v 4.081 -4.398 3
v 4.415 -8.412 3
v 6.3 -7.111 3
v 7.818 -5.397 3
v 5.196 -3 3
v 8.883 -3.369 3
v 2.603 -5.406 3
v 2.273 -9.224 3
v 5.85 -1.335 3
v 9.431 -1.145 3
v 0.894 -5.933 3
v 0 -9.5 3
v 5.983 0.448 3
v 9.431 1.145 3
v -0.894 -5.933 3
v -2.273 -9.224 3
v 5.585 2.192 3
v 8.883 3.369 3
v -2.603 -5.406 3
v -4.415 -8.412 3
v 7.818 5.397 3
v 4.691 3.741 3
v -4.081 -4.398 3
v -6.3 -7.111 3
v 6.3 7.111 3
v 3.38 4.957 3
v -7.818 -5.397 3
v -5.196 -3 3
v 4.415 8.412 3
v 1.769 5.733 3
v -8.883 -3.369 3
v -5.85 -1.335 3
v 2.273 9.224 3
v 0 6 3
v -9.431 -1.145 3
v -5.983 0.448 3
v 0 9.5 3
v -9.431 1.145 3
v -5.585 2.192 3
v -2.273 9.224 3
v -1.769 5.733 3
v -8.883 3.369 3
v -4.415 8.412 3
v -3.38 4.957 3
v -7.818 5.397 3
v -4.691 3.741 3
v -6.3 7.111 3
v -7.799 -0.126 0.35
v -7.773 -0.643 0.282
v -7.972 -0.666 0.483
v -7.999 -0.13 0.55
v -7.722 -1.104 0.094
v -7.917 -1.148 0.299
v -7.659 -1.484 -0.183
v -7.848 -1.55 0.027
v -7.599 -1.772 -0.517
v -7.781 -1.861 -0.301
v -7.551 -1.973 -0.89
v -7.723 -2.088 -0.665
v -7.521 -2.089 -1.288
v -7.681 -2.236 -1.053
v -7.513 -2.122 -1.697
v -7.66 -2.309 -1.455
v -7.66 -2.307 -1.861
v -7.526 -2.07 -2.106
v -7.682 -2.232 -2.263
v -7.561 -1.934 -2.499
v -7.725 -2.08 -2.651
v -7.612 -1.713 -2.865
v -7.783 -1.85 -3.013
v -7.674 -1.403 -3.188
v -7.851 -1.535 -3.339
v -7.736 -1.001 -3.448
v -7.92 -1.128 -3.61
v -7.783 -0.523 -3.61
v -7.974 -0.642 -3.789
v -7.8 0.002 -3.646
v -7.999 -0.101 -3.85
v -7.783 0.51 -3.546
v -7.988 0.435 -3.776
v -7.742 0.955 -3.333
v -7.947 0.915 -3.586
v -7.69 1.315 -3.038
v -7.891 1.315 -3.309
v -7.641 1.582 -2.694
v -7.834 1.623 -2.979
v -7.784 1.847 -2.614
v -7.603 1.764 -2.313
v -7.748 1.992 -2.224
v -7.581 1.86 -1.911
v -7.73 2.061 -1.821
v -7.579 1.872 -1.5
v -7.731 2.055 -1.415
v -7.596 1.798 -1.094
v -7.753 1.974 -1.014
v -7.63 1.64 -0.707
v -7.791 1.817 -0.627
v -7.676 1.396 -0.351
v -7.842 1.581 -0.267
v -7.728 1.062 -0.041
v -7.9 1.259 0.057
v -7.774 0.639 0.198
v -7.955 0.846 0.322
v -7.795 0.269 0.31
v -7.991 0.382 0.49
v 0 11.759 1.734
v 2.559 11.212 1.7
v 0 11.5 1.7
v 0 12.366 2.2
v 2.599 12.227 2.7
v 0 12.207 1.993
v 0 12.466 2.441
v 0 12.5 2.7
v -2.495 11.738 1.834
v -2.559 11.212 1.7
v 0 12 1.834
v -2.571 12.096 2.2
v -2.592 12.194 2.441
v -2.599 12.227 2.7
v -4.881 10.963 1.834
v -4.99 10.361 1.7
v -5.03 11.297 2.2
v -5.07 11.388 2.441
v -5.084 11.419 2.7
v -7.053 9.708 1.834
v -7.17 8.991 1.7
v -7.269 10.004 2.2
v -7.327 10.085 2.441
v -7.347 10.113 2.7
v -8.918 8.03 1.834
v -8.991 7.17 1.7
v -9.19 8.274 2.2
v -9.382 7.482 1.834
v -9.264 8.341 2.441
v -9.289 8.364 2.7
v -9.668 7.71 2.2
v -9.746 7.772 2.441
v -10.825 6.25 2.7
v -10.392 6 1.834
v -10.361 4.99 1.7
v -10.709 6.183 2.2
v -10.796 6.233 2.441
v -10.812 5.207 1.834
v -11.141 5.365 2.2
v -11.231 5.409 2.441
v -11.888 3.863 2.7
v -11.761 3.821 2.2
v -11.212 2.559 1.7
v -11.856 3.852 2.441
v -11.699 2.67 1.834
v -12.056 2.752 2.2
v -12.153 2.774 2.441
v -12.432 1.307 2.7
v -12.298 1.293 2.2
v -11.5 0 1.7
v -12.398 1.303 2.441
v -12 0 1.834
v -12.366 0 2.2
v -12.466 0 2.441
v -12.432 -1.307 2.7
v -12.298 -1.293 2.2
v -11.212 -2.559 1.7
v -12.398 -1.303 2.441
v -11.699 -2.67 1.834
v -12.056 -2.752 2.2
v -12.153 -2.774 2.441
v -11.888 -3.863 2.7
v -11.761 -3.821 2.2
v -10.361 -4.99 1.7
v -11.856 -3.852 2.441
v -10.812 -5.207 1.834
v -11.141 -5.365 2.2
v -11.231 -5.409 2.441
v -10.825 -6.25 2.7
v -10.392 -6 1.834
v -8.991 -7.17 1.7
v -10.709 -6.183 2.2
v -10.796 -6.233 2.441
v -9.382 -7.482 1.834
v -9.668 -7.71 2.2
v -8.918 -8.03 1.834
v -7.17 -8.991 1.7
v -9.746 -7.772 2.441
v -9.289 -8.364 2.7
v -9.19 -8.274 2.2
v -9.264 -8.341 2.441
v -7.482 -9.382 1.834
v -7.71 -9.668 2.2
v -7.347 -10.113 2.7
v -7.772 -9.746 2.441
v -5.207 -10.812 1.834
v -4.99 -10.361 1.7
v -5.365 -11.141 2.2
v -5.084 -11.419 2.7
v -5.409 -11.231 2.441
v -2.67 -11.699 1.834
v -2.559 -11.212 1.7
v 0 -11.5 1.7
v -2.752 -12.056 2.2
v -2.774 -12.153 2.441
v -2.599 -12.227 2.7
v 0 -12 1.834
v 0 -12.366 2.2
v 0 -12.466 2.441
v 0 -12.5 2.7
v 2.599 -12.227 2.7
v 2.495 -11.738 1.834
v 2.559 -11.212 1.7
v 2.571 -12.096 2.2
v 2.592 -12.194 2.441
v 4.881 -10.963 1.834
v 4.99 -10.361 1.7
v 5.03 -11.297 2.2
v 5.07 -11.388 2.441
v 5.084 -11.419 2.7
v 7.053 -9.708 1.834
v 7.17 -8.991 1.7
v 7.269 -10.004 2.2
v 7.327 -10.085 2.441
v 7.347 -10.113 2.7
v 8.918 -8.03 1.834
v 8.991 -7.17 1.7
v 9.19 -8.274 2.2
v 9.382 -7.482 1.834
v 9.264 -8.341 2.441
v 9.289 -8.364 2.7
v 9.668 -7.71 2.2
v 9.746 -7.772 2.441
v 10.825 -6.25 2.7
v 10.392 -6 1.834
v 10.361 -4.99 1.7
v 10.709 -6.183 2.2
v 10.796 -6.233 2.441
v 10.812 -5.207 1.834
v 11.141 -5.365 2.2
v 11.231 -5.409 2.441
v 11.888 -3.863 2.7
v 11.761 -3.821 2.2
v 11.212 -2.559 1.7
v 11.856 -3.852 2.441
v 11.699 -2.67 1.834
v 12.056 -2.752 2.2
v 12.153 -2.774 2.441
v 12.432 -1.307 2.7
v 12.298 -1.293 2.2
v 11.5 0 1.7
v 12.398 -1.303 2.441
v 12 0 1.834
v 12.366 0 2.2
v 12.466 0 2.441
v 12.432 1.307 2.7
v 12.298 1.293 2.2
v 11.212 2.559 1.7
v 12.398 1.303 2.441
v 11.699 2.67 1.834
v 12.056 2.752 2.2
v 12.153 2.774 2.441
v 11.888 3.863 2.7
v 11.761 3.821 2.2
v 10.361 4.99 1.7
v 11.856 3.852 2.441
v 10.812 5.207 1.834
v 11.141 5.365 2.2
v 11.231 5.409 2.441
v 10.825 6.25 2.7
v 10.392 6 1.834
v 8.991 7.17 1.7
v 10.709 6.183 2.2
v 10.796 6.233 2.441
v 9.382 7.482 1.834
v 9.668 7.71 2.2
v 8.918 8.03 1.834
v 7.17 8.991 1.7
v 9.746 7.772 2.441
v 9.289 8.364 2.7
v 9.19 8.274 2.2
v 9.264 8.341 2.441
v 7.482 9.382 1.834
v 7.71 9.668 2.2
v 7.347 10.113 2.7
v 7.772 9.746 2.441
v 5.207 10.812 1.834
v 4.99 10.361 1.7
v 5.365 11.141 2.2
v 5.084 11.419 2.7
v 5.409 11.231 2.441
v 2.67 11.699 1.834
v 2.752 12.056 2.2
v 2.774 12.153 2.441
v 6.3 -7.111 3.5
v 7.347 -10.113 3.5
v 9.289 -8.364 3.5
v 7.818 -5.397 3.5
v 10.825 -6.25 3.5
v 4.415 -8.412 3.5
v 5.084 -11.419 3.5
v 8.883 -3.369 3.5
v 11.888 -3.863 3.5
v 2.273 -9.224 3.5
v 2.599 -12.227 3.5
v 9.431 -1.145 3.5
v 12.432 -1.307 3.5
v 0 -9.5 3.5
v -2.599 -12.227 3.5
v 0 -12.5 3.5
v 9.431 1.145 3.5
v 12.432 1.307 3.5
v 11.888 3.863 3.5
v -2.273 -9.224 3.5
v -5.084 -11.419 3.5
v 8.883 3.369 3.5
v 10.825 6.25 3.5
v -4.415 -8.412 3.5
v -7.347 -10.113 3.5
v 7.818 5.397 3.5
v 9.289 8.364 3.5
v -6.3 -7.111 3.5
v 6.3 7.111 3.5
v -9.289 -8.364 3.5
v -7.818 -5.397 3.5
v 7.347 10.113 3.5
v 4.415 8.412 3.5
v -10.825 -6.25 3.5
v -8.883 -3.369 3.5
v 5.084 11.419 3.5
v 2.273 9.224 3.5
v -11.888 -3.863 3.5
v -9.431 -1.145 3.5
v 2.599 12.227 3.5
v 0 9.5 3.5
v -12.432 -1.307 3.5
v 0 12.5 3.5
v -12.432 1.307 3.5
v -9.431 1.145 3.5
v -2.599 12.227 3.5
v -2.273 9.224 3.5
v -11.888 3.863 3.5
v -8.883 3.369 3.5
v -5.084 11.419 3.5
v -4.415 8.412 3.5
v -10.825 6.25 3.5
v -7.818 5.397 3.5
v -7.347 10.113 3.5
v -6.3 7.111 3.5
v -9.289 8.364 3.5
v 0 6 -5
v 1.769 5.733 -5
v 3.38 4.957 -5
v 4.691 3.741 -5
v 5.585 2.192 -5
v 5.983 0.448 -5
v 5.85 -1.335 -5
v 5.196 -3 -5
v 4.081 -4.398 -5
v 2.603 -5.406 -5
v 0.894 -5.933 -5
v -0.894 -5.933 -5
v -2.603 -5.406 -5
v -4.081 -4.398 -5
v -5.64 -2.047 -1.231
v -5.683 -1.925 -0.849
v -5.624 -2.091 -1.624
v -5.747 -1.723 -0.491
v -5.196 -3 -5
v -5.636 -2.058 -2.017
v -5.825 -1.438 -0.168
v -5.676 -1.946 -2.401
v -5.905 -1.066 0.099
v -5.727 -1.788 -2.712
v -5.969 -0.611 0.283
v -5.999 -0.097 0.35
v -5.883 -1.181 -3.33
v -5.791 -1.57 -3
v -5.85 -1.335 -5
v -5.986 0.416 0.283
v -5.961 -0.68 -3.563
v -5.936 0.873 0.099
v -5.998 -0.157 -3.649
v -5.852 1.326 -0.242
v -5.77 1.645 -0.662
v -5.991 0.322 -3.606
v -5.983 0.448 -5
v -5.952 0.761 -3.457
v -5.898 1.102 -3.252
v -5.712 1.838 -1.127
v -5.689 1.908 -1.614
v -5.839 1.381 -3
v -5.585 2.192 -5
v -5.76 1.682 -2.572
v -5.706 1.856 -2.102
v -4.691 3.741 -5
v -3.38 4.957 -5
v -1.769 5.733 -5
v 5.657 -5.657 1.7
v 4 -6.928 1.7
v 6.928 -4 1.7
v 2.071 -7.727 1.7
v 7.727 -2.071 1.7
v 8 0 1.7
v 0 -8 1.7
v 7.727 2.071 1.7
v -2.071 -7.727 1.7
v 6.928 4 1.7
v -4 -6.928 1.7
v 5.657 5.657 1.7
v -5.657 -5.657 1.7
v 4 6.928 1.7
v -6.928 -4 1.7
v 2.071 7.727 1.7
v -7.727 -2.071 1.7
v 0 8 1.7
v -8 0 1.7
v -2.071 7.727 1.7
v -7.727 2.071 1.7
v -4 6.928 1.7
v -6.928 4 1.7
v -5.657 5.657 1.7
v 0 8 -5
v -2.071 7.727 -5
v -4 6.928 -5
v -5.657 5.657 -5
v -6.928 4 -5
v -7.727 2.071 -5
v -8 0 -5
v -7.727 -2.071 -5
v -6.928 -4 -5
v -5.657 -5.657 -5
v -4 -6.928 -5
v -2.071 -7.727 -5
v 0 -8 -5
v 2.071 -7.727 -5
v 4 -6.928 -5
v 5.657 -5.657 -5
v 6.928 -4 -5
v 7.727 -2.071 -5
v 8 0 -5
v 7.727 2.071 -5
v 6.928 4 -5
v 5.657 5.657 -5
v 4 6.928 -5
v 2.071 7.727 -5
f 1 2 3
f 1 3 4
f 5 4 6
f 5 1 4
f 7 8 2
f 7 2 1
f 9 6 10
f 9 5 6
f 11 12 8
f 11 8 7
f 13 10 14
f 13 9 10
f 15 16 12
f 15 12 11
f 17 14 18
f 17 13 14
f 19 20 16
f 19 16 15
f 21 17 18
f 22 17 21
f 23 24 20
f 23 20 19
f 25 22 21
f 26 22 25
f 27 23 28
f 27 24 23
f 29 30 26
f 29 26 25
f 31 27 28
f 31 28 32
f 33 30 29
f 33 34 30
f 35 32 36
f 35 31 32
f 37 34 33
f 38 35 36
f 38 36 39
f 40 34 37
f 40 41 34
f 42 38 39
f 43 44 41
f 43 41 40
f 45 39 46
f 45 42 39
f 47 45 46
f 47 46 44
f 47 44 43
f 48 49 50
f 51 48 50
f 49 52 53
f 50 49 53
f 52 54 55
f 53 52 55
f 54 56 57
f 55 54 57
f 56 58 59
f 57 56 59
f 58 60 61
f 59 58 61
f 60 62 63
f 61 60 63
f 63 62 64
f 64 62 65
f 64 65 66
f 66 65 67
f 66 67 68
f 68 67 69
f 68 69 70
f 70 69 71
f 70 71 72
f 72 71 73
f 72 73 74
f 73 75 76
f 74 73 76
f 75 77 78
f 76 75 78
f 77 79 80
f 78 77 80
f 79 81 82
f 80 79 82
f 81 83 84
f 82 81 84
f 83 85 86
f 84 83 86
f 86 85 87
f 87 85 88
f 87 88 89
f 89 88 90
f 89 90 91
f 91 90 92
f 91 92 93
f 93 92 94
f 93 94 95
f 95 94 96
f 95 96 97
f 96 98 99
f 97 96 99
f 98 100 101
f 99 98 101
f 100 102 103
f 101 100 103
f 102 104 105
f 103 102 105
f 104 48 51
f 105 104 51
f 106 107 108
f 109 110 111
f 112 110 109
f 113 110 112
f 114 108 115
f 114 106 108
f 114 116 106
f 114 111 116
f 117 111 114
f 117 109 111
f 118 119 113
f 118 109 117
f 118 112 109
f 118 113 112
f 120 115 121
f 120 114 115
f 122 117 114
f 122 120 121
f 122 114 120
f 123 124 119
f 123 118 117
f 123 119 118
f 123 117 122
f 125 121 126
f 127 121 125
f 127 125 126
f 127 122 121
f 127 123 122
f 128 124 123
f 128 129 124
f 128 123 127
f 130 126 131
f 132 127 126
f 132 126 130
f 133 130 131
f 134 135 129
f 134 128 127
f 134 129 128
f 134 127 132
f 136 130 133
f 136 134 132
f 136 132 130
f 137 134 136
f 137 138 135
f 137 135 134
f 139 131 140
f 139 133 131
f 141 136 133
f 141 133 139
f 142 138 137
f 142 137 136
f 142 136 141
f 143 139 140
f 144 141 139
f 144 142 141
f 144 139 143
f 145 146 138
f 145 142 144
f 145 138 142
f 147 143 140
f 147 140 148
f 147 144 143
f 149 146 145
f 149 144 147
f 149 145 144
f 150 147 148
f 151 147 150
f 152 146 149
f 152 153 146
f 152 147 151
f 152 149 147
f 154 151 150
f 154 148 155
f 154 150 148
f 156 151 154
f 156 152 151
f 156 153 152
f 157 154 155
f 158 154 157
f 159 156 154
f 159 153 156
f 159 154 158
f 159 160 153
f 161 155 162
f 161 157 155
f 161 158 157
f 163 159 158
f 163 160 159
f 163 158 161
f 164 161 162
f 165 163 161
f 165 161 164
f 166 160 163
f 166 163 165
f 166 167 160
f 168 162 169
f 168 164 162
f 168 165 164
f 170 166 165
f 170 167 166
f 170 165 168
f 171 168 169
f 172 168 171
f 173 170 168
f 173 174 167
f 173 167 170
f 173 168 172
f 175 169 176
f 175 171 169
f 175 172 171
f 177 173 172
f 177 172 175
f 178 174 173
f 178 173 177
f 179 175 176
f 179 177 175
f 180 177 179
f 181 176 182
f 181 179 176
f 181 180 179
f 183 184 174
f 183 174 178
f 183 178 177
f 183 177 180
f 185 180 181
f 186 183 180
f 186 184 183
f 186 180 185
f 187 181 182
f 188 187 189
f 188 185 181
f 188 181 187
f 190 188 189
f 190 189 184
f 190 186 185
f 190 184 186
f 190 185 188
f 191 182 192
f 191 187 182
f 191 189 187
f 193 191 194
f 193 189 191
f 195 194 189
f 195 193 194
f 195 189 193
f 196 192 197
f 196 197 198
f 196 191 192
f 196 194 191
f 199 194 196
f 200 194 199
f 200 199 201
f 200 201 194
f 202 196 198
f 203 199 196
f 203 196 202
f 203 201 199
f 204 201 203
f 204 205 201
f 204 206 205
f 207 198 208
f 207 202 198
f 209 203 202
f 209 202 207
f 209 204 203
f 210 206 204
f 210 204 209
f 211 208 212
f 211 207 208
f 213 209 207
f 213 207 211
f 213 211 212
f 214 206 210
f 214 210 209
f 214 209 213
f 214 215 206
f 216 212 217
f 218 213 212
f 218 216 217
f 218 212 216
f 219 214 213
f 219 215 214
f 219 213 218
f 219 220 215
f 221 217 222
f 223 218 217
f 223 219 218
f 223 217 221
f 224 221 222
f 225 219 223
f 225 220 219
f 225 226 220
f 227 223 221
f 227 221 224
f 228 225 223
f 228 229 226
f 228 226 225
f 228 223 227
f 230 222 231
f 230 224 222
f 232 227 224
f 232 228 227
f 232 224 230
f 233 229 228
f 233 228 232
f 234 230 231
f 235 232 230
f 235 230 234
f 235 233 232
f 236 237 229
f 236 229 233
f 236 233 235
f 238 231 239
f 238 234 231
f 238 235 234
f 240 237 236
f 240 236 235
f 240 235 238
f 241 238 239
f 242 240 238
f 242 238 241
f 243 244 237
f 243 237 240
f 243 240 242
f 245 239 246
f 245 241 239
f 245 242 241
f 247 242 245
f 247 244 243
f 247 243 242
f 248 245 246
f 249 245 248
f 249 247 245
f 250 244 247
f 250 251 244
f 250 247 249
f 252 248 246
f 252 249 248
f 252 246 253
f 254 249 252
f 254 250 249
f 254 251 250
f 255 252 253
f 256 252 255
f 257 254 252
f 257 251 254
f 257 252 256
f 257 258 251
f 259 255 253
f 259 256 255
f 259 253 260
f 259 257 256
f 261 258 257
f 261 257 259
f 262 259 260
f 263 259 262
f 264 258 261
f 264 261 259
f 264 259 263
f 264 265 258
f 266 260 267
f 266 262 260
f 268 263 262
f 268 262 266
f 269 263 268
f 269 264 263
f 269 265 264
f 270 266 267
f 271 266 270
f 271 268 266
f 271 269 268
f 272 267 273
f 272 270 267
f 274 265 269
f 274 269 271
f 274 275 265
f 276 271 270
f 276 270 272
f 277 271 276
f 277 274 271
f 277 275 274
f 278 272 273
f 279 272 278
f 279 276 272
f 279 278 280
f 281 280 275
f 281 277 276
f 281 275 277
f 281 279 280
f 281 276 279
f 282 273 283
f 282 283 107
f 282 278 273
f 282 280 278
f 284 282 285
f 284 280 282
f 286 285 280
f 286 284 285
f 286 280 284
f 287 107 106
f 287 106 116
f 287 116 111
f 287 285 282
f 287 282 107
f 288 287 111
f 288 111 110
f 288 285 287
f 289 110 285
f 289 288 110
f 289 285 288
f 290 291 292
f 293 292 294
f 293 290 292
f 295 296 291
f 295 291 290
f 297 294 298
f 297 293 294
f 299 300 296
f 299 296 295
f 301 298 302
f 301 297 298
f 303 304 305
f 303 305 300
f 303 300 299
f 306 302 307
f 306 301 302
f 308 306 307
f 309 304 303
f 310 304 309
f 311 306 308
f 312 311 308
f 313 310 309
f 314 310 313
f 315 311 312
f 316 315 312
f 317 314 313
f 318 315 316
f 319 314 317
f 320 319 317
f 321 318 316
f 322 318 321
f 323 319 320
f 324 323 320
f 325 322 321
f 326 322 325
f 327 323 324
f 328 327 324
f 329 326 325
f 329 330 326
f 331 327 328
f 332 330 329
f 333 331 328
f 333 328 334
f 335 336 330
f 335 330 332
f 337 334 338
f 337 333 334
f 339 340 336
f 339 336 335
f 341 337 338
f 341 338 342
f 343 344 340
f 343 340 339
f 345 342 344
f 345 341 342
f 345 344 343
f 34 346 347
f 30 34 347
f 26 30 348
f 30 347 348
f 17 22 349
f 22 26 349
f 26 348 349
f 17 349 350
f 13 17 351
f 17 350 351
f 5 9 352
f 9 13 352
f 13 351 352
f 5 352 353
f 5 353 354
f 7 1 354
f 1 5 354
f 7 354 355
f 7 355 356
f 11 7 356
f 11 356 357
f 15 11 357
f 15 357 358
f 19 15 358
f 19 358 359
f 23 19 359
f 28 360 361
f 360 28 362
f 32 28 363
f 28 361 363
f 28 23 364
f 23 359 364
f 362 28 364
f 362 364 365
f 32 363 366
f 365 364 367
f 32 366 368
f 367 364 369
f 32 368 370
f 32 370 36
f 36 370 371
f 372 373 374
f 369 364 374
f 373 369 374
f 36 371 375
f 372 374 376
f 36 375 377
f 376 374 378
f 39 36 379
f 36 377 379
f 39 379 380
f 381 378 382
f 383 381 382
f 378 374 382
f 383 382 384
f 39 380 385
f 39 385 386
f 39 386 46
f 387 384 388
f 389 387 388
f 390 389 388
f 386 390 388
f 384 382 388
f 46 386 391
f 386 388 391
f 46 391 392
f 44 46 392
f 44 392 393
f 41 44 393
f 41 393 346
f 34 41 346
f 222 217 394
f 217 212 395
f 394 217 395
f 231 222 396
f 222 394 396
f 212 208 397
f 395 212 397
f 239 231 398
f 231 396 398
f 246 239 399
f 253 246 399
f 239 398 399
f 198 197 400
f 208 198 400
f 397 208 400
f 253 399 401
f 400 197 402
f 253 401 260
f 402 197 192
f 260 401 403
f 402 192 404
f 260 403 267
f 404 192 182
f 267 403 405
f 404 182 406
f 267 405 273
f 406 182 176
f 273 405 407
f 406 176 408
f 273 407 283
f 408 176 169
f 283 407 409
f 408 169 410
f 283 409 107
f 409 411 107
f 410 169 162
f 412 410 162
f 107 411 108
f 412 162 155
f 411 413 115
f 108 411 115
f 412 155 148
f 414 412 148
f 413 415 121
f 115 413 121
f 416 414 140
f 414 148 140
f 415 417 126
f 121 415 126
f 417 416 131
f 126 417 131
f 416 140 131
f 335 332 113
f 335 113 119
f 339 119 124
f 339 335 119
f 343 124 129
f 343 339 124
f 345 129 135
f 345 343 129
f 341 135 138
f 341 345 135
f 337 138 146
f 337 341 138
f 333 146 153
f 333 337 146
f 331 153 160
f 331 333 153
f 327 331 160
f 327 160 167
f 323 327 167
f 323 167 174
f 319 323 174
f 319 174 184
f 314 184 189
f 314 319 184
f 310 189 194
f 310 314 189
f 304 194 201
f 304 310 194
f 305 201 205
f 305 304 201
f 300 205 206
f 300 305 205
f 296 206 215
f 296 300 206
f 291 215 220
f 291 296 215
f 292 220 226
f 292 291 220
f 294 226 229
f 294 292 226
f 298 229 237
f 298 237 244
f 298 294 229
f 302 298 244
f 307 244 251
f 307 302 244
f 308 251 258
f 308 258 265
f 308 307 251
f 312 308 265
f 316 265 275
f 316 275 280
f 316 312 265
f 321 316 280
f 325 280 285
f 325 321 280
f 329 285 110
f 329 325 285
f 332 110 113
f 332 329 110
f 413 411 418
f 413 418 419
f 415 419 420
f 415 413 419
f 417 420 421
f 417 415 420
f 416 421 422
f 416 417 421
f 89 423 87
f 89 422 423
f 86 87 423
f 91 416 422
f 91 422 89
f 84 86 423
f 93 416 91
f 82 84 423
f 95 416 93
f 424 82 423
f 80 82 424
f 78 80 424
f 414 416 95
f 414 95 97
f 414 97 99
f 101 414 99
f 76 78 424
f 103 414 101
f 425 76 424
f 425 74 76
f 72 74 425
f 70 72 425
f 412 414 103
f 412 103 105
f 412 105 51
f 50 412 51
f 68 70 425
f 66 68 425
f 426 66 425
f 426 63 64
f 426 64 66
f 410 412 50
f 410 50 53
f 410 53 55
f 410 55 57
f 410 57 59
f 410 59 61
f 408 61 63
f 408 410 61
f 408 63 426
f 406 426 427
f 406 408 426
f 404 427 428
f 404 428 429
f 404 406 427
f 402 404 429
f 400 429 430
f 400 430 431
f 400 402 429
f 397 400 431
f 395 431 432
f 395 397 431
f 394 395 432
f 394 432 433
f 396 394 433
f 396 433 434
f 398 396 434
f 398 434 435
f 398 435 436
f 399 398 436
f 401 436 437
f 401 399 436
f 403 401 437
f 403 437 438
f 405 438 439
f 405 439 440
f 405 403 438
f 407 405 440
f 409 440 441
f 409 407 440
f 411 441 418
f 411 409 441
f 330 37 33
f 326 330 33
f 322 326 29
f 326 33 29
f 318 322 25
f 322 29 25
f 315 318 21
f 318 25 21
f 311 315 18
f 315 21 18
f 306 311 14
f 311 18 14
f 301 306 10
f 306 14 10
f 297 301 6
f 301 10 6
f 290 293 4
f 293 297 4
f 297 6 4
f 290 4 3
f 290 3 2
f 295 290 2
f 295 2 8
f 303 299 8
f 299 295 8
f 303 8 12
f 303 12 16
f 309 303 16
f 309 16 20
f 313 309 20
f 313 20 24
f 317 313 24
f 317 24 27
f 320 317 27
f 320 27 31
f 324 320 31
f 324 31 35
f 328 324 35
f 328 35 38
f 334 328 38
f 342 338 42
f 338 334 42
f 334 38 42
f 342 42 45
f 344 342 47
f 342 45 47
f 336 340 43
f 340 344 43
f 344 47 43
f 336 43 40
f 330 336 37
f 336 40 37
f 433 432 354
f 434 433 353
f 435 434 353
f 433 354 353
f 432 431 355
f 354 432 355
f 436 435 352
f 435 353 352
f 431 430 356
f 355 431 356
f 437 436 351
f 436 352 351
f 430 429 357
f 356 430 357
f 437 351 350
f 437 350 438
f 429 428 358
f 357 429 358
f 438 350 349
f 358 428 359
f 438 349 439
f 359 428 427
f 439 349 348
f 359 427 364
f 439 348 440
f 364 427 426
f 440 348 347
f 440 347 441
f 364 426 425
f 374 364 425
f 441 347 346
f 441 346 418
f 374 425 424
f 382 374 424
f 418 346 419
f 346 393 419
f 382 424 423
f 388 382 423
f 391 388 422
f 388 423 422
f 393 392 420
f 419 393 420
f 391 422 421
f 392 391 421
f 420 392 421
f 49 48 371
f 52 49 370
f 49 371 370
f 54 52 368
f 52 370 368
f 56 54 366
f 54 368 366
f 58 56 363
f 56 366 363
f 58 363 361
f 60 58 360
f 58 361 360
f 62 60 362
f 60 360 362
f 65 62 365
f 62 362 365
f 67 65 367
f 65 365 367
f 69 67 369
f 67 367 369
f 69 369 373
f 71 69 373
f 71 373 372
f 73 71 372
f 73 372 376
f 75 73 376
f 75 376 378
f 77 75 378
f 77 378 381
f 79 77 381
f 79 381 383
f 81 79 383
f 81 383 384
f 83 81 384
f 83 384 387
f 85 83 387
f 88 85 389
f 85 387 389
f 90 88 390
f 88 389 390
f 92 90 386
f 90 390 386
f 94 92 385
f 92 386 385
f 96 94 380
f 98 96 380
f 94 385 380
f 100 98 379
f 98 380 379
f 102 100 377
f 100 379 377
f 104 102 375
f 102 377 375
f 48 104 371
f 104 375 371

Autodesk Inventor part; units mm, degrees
ref_plane "YZ Plane" through (0, 0, 0) normal (1, 0, 0) x (0, 1, 0)
ref_plane "XZ Plane" through (0, 0, 0) normal (0, 1, 0) x (-1, 0, 0)
ref_plane "XY Plane" through (0, 0, 0) normal (0, 0, 1) x (1, 0, 0)
sketch "Sketch1" plane through (0, 0, 0) normal (1, 0, 0) x (0, 1, 0)
  line L0 (6, 3) -> (6, -3)
  line L1 (8, 1.7) -> (11.5, 1.7)
  line L2 (12.5, 2.7) -> (12.5, 3.5)
  line L3 (12.5, 2.7) -> (11.5, 2.7) construction
  line L4 (11.5, 2.7) -> (11.5, 1.7) construction
  arc A0 (11.5, 1.7) -> (12.5, 2.7) centre (11.5, 2.7) ccw
  line L5 (6, 3) -> (9.5, 3)
  line L6 (12.5, 3.5) -> (9.5, 3.5)
  line L7 (9.5, 3.5) -> (9.5, 3)
  line L8 (0, 0) -> (0, 11.4482) construction
  line L9 (8, -3) -> (8, 1.7)
  line L10 (6, -3) -> (6, -5)
  line L11 (6, -5) -> (8, -5)
  line L12 (8, -5) -> (8, -3)
  point P0 (7, 0.2)
  dimension "d0" = 6
  dimension "d1" = 3
  dimension "d5" = 0.8
  dimension "d6" = 1
  dimension "d7" = 1
  dimension "d8" = 3
  dimension "d10" = 6
  dimension "d12" = 0.5
  dimension "d14" = 3.5
  dimension "d26" = 2
  dimension "d27" = 4.7
revolve "Revolution1" add sketch "Sketch1" angle 360 about axis through (0, 0, 0) along (0, 0, 1)
ref_plane "Work Plane2" through (-7.9989, -0.1297, -1.65) normal (-0.9998686, -0.0162116, 0) x (0, 0, 1)
ref_plane "Work Plane1" through (21.3966, -11.9547, -30.348) normal (-0.9998686, -0.0162116, 0) x (0, 0, 1)
sketch "Sketch2" plane through (-7.9989, -0.1297, -1.65) normal (-0.9998686, -0.0162116, 0) x (0, 0, 1)
  circle A0 centre (0, 0) radius 1.5
  point P0 (1.65, 0)
  dimension "d15" = 3
hole "Hole1" at (-7.9989, -0.1297, -1.65) direction (0.9998686, 0.0162116, 0) diameter 4 depth 8.8 tip angle 118
chamfer "Chamfer1" distance 0.2 angle 45 2 edges at (-7.8033, 1.7632, -0.9945) (-7.742, -2.0152, -0.9943)
ref_plane "Work Plane4" through (-7.9989, -0.1297, 0.55) normal (-0.9998686, -0.0162116, 0) x (0.0162116, -0.9998686, 0)
equation "\"d1\" = 0.5 * d0"
equation "\"d7\" = d6"
properties part number "tarcza sprzęgła"
